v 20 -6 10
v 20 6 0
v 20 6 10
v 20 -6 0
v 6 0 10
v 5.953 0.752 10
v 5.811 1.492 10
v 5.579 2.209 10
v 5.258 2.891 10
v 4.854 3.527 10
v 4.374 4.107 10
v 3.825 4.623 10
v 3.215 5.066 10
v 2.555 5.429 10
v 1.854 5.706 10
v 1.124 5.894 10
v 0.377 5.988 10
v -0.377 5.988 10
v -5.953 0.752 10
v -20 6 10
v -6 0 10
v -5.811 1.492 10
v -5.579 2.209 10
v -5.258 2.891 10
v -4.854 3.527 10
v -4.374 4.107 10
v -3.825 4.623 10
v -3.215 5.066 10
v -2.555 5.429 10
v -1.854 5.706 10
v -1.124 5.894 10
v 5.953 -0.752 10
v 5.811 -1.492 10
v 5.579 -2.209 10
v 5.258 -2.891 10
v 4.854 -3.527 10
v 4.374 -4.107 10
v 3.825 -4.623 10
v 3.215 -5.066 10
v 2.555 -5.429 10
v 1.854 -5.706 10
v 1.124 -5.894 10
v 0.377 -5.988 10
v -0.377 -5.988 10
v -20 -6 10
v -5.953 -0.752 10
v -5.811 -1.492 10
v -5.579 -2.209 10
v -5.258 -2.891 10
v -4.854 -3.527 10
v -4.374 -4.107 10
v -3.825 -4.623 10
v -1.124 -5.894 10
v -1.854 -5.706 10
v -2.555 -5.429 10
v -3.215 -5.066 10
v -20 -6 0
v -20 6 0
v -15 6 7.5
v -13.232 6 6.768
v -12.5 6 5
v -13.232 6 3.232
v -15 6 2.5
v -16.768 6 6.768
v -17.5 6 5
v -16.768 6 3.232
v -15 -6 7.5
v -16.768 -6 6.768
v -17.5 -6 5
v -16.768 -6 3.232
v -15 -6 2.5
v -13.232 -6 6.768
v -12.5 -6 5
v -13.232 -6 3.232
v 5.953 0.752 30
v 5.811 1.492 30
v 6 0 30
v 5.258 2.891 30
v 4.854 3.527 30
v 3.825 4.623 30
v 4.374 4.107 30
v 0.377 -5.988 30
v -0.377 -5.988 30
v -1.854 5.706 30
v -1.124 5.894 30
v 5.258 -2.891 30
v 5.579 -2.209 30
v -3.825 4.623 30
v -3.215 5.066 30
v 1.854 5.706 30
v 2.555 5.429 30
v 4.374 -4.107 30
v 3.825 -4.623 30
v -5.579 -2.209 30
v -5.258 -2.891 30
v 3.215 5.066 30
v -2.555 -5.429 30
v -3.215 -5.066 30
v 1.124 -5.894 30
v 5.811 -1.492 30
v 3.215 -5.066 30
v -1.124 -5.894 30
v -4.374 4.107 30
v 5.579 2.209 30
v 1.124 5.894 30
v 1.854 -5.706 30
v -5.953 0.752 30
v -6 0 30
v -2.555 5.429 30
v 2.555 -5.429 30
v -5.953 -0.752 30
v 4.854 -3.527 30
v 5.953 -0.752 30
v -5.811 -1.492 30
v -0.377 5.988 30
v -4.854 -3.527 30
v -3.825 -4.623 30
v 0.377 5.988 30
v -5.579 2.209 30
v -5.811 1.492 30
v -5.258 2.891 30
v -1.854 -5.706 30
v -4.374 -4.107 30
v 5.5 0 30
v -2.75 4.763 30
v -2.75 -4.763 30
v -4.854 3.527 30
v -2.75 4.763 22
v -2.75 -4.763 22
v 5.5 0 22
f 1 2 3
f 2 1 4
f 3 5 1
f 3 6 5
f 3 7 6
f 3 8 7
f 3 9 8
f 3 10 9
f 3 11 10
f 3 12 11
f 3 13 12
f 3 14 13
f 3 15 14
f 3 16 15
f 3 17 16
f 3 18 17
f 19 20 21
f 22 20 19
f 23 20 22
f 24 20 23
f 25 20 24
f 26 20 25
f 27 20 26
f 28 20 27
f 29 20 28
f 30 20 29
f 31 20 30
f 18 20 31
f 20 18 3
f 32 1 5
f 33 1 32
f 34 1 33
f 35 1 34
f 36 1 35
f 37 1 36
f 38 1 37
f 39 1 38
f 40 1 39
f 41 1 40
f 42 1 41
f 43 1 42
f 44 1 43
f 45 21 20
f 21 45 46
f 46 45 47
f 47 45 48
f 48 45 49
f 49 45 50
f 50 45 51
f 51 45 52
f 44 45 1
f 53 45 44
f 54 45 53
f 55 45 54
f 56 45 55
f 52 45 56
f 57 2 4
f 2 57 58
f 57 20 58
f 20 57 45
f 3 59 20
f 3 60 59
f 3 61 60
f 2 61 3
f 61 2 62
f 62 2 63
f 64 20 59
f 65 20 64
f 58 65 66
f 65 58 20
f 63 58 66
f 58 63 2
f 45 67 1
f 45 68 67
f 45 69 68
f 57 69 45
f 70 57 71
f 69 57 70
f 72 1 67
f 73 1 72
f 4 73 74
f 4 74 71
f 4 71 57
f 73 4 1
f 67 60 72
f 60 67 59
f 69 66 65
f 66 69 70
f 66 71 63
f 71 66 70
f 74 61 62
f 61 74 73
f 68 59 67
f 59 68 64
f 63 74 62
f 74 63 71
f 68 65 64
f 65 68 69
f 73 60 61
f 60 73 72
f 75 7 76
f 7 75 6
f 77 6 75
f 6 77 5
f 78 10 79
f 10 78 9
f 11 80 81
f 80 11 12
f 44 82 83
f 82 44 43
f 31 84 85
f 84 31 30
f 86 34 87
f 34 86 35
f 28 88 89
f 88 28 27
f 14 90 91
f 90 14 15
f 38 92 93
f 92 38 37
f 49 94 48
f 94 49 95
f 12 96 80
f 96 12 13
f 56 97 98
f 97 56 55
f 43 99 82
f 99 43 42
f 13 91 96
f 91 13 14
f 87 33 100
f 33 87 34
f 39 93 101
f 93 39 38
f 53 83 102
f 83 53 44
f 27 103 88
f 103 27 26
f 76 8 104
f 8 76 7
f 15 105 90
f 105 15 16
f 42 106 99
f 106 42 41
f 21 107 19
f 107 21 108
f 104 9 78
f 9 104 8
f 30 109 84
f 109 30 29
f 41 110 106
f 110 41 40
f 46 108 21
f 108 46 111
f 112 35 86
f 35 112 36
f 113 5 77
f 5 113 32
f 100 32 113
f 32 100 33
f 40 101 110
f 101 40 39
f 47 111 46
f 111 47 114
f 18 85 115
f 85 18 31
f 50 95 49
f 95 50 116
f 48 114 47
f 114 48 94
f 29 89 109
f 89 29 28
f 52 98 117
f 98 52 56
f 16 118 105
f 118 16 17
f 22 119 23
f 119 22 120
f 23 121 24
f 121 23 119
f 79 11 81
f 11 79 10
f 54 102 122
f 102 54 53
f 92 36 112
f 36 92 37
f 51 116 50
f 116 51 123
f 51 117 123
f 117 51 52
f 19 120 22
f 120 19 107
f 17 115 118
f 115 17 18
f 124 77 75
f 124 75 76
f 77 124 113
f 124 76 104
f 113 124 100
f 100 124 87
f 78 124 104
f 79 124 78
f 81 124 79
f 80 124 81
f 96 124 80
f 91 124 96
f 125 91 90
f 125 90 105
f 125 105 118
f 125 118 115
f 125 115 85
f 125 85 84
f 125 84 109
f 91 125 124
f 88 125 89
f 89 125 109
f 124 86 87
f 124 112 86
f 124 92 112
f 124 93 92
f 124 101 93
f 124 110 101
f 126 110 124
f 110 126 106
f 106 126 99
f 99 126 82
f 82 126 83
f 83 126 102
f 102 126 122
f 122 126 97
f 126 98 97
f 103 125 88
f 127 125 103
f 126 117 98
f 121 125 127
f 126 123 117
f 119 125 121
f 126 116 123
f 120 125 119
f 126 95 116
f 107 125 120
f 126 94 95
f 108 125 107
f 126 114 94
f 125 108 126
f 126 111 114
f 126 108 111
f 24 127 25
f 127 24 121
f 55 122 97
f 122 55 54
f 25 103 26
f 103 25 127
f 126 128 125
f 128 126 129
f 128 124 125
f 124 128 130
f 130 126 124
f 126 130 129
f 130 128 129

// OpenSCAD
/* 
 * Special key generator
 * All units are in milimeters
 *
 * author R. A. - 2015/12/08
 * e-mail: thingiverse@dexter.sk
 * Thingiverse username: dexterko
 *
 * Feel free to modify and distribute, but please keep the credits;-)
 */

outer_diameter=12;
inner_diameter=11;
height_of_shank=20; 
number_of_center_sides=3;
depth_of_center_hole=8;

union() {
    // key bow
    difference() {
        translate([-20, 0-(outer_diameter/2), 0])
        cube([40,outer_diameter,10]);
        
        //a hole in the bow
        rotate([0, 90, 90])
        translate([-5,15,-20])
        cylinder(r=2.5, h=40);
    }

    // Shank
    difference() {
        translate([0, 0, 10])
        cylinder(d=outer_diameter, h=height_of_shank, $fn=50);

        translate([0,0, 10+height_of_shank-depth_of_center_hole])
        cylinder(d=inner_diameter, h=depth_of_center_hole+1, $fn=number_of_center_sides);
    
    
    }

}
